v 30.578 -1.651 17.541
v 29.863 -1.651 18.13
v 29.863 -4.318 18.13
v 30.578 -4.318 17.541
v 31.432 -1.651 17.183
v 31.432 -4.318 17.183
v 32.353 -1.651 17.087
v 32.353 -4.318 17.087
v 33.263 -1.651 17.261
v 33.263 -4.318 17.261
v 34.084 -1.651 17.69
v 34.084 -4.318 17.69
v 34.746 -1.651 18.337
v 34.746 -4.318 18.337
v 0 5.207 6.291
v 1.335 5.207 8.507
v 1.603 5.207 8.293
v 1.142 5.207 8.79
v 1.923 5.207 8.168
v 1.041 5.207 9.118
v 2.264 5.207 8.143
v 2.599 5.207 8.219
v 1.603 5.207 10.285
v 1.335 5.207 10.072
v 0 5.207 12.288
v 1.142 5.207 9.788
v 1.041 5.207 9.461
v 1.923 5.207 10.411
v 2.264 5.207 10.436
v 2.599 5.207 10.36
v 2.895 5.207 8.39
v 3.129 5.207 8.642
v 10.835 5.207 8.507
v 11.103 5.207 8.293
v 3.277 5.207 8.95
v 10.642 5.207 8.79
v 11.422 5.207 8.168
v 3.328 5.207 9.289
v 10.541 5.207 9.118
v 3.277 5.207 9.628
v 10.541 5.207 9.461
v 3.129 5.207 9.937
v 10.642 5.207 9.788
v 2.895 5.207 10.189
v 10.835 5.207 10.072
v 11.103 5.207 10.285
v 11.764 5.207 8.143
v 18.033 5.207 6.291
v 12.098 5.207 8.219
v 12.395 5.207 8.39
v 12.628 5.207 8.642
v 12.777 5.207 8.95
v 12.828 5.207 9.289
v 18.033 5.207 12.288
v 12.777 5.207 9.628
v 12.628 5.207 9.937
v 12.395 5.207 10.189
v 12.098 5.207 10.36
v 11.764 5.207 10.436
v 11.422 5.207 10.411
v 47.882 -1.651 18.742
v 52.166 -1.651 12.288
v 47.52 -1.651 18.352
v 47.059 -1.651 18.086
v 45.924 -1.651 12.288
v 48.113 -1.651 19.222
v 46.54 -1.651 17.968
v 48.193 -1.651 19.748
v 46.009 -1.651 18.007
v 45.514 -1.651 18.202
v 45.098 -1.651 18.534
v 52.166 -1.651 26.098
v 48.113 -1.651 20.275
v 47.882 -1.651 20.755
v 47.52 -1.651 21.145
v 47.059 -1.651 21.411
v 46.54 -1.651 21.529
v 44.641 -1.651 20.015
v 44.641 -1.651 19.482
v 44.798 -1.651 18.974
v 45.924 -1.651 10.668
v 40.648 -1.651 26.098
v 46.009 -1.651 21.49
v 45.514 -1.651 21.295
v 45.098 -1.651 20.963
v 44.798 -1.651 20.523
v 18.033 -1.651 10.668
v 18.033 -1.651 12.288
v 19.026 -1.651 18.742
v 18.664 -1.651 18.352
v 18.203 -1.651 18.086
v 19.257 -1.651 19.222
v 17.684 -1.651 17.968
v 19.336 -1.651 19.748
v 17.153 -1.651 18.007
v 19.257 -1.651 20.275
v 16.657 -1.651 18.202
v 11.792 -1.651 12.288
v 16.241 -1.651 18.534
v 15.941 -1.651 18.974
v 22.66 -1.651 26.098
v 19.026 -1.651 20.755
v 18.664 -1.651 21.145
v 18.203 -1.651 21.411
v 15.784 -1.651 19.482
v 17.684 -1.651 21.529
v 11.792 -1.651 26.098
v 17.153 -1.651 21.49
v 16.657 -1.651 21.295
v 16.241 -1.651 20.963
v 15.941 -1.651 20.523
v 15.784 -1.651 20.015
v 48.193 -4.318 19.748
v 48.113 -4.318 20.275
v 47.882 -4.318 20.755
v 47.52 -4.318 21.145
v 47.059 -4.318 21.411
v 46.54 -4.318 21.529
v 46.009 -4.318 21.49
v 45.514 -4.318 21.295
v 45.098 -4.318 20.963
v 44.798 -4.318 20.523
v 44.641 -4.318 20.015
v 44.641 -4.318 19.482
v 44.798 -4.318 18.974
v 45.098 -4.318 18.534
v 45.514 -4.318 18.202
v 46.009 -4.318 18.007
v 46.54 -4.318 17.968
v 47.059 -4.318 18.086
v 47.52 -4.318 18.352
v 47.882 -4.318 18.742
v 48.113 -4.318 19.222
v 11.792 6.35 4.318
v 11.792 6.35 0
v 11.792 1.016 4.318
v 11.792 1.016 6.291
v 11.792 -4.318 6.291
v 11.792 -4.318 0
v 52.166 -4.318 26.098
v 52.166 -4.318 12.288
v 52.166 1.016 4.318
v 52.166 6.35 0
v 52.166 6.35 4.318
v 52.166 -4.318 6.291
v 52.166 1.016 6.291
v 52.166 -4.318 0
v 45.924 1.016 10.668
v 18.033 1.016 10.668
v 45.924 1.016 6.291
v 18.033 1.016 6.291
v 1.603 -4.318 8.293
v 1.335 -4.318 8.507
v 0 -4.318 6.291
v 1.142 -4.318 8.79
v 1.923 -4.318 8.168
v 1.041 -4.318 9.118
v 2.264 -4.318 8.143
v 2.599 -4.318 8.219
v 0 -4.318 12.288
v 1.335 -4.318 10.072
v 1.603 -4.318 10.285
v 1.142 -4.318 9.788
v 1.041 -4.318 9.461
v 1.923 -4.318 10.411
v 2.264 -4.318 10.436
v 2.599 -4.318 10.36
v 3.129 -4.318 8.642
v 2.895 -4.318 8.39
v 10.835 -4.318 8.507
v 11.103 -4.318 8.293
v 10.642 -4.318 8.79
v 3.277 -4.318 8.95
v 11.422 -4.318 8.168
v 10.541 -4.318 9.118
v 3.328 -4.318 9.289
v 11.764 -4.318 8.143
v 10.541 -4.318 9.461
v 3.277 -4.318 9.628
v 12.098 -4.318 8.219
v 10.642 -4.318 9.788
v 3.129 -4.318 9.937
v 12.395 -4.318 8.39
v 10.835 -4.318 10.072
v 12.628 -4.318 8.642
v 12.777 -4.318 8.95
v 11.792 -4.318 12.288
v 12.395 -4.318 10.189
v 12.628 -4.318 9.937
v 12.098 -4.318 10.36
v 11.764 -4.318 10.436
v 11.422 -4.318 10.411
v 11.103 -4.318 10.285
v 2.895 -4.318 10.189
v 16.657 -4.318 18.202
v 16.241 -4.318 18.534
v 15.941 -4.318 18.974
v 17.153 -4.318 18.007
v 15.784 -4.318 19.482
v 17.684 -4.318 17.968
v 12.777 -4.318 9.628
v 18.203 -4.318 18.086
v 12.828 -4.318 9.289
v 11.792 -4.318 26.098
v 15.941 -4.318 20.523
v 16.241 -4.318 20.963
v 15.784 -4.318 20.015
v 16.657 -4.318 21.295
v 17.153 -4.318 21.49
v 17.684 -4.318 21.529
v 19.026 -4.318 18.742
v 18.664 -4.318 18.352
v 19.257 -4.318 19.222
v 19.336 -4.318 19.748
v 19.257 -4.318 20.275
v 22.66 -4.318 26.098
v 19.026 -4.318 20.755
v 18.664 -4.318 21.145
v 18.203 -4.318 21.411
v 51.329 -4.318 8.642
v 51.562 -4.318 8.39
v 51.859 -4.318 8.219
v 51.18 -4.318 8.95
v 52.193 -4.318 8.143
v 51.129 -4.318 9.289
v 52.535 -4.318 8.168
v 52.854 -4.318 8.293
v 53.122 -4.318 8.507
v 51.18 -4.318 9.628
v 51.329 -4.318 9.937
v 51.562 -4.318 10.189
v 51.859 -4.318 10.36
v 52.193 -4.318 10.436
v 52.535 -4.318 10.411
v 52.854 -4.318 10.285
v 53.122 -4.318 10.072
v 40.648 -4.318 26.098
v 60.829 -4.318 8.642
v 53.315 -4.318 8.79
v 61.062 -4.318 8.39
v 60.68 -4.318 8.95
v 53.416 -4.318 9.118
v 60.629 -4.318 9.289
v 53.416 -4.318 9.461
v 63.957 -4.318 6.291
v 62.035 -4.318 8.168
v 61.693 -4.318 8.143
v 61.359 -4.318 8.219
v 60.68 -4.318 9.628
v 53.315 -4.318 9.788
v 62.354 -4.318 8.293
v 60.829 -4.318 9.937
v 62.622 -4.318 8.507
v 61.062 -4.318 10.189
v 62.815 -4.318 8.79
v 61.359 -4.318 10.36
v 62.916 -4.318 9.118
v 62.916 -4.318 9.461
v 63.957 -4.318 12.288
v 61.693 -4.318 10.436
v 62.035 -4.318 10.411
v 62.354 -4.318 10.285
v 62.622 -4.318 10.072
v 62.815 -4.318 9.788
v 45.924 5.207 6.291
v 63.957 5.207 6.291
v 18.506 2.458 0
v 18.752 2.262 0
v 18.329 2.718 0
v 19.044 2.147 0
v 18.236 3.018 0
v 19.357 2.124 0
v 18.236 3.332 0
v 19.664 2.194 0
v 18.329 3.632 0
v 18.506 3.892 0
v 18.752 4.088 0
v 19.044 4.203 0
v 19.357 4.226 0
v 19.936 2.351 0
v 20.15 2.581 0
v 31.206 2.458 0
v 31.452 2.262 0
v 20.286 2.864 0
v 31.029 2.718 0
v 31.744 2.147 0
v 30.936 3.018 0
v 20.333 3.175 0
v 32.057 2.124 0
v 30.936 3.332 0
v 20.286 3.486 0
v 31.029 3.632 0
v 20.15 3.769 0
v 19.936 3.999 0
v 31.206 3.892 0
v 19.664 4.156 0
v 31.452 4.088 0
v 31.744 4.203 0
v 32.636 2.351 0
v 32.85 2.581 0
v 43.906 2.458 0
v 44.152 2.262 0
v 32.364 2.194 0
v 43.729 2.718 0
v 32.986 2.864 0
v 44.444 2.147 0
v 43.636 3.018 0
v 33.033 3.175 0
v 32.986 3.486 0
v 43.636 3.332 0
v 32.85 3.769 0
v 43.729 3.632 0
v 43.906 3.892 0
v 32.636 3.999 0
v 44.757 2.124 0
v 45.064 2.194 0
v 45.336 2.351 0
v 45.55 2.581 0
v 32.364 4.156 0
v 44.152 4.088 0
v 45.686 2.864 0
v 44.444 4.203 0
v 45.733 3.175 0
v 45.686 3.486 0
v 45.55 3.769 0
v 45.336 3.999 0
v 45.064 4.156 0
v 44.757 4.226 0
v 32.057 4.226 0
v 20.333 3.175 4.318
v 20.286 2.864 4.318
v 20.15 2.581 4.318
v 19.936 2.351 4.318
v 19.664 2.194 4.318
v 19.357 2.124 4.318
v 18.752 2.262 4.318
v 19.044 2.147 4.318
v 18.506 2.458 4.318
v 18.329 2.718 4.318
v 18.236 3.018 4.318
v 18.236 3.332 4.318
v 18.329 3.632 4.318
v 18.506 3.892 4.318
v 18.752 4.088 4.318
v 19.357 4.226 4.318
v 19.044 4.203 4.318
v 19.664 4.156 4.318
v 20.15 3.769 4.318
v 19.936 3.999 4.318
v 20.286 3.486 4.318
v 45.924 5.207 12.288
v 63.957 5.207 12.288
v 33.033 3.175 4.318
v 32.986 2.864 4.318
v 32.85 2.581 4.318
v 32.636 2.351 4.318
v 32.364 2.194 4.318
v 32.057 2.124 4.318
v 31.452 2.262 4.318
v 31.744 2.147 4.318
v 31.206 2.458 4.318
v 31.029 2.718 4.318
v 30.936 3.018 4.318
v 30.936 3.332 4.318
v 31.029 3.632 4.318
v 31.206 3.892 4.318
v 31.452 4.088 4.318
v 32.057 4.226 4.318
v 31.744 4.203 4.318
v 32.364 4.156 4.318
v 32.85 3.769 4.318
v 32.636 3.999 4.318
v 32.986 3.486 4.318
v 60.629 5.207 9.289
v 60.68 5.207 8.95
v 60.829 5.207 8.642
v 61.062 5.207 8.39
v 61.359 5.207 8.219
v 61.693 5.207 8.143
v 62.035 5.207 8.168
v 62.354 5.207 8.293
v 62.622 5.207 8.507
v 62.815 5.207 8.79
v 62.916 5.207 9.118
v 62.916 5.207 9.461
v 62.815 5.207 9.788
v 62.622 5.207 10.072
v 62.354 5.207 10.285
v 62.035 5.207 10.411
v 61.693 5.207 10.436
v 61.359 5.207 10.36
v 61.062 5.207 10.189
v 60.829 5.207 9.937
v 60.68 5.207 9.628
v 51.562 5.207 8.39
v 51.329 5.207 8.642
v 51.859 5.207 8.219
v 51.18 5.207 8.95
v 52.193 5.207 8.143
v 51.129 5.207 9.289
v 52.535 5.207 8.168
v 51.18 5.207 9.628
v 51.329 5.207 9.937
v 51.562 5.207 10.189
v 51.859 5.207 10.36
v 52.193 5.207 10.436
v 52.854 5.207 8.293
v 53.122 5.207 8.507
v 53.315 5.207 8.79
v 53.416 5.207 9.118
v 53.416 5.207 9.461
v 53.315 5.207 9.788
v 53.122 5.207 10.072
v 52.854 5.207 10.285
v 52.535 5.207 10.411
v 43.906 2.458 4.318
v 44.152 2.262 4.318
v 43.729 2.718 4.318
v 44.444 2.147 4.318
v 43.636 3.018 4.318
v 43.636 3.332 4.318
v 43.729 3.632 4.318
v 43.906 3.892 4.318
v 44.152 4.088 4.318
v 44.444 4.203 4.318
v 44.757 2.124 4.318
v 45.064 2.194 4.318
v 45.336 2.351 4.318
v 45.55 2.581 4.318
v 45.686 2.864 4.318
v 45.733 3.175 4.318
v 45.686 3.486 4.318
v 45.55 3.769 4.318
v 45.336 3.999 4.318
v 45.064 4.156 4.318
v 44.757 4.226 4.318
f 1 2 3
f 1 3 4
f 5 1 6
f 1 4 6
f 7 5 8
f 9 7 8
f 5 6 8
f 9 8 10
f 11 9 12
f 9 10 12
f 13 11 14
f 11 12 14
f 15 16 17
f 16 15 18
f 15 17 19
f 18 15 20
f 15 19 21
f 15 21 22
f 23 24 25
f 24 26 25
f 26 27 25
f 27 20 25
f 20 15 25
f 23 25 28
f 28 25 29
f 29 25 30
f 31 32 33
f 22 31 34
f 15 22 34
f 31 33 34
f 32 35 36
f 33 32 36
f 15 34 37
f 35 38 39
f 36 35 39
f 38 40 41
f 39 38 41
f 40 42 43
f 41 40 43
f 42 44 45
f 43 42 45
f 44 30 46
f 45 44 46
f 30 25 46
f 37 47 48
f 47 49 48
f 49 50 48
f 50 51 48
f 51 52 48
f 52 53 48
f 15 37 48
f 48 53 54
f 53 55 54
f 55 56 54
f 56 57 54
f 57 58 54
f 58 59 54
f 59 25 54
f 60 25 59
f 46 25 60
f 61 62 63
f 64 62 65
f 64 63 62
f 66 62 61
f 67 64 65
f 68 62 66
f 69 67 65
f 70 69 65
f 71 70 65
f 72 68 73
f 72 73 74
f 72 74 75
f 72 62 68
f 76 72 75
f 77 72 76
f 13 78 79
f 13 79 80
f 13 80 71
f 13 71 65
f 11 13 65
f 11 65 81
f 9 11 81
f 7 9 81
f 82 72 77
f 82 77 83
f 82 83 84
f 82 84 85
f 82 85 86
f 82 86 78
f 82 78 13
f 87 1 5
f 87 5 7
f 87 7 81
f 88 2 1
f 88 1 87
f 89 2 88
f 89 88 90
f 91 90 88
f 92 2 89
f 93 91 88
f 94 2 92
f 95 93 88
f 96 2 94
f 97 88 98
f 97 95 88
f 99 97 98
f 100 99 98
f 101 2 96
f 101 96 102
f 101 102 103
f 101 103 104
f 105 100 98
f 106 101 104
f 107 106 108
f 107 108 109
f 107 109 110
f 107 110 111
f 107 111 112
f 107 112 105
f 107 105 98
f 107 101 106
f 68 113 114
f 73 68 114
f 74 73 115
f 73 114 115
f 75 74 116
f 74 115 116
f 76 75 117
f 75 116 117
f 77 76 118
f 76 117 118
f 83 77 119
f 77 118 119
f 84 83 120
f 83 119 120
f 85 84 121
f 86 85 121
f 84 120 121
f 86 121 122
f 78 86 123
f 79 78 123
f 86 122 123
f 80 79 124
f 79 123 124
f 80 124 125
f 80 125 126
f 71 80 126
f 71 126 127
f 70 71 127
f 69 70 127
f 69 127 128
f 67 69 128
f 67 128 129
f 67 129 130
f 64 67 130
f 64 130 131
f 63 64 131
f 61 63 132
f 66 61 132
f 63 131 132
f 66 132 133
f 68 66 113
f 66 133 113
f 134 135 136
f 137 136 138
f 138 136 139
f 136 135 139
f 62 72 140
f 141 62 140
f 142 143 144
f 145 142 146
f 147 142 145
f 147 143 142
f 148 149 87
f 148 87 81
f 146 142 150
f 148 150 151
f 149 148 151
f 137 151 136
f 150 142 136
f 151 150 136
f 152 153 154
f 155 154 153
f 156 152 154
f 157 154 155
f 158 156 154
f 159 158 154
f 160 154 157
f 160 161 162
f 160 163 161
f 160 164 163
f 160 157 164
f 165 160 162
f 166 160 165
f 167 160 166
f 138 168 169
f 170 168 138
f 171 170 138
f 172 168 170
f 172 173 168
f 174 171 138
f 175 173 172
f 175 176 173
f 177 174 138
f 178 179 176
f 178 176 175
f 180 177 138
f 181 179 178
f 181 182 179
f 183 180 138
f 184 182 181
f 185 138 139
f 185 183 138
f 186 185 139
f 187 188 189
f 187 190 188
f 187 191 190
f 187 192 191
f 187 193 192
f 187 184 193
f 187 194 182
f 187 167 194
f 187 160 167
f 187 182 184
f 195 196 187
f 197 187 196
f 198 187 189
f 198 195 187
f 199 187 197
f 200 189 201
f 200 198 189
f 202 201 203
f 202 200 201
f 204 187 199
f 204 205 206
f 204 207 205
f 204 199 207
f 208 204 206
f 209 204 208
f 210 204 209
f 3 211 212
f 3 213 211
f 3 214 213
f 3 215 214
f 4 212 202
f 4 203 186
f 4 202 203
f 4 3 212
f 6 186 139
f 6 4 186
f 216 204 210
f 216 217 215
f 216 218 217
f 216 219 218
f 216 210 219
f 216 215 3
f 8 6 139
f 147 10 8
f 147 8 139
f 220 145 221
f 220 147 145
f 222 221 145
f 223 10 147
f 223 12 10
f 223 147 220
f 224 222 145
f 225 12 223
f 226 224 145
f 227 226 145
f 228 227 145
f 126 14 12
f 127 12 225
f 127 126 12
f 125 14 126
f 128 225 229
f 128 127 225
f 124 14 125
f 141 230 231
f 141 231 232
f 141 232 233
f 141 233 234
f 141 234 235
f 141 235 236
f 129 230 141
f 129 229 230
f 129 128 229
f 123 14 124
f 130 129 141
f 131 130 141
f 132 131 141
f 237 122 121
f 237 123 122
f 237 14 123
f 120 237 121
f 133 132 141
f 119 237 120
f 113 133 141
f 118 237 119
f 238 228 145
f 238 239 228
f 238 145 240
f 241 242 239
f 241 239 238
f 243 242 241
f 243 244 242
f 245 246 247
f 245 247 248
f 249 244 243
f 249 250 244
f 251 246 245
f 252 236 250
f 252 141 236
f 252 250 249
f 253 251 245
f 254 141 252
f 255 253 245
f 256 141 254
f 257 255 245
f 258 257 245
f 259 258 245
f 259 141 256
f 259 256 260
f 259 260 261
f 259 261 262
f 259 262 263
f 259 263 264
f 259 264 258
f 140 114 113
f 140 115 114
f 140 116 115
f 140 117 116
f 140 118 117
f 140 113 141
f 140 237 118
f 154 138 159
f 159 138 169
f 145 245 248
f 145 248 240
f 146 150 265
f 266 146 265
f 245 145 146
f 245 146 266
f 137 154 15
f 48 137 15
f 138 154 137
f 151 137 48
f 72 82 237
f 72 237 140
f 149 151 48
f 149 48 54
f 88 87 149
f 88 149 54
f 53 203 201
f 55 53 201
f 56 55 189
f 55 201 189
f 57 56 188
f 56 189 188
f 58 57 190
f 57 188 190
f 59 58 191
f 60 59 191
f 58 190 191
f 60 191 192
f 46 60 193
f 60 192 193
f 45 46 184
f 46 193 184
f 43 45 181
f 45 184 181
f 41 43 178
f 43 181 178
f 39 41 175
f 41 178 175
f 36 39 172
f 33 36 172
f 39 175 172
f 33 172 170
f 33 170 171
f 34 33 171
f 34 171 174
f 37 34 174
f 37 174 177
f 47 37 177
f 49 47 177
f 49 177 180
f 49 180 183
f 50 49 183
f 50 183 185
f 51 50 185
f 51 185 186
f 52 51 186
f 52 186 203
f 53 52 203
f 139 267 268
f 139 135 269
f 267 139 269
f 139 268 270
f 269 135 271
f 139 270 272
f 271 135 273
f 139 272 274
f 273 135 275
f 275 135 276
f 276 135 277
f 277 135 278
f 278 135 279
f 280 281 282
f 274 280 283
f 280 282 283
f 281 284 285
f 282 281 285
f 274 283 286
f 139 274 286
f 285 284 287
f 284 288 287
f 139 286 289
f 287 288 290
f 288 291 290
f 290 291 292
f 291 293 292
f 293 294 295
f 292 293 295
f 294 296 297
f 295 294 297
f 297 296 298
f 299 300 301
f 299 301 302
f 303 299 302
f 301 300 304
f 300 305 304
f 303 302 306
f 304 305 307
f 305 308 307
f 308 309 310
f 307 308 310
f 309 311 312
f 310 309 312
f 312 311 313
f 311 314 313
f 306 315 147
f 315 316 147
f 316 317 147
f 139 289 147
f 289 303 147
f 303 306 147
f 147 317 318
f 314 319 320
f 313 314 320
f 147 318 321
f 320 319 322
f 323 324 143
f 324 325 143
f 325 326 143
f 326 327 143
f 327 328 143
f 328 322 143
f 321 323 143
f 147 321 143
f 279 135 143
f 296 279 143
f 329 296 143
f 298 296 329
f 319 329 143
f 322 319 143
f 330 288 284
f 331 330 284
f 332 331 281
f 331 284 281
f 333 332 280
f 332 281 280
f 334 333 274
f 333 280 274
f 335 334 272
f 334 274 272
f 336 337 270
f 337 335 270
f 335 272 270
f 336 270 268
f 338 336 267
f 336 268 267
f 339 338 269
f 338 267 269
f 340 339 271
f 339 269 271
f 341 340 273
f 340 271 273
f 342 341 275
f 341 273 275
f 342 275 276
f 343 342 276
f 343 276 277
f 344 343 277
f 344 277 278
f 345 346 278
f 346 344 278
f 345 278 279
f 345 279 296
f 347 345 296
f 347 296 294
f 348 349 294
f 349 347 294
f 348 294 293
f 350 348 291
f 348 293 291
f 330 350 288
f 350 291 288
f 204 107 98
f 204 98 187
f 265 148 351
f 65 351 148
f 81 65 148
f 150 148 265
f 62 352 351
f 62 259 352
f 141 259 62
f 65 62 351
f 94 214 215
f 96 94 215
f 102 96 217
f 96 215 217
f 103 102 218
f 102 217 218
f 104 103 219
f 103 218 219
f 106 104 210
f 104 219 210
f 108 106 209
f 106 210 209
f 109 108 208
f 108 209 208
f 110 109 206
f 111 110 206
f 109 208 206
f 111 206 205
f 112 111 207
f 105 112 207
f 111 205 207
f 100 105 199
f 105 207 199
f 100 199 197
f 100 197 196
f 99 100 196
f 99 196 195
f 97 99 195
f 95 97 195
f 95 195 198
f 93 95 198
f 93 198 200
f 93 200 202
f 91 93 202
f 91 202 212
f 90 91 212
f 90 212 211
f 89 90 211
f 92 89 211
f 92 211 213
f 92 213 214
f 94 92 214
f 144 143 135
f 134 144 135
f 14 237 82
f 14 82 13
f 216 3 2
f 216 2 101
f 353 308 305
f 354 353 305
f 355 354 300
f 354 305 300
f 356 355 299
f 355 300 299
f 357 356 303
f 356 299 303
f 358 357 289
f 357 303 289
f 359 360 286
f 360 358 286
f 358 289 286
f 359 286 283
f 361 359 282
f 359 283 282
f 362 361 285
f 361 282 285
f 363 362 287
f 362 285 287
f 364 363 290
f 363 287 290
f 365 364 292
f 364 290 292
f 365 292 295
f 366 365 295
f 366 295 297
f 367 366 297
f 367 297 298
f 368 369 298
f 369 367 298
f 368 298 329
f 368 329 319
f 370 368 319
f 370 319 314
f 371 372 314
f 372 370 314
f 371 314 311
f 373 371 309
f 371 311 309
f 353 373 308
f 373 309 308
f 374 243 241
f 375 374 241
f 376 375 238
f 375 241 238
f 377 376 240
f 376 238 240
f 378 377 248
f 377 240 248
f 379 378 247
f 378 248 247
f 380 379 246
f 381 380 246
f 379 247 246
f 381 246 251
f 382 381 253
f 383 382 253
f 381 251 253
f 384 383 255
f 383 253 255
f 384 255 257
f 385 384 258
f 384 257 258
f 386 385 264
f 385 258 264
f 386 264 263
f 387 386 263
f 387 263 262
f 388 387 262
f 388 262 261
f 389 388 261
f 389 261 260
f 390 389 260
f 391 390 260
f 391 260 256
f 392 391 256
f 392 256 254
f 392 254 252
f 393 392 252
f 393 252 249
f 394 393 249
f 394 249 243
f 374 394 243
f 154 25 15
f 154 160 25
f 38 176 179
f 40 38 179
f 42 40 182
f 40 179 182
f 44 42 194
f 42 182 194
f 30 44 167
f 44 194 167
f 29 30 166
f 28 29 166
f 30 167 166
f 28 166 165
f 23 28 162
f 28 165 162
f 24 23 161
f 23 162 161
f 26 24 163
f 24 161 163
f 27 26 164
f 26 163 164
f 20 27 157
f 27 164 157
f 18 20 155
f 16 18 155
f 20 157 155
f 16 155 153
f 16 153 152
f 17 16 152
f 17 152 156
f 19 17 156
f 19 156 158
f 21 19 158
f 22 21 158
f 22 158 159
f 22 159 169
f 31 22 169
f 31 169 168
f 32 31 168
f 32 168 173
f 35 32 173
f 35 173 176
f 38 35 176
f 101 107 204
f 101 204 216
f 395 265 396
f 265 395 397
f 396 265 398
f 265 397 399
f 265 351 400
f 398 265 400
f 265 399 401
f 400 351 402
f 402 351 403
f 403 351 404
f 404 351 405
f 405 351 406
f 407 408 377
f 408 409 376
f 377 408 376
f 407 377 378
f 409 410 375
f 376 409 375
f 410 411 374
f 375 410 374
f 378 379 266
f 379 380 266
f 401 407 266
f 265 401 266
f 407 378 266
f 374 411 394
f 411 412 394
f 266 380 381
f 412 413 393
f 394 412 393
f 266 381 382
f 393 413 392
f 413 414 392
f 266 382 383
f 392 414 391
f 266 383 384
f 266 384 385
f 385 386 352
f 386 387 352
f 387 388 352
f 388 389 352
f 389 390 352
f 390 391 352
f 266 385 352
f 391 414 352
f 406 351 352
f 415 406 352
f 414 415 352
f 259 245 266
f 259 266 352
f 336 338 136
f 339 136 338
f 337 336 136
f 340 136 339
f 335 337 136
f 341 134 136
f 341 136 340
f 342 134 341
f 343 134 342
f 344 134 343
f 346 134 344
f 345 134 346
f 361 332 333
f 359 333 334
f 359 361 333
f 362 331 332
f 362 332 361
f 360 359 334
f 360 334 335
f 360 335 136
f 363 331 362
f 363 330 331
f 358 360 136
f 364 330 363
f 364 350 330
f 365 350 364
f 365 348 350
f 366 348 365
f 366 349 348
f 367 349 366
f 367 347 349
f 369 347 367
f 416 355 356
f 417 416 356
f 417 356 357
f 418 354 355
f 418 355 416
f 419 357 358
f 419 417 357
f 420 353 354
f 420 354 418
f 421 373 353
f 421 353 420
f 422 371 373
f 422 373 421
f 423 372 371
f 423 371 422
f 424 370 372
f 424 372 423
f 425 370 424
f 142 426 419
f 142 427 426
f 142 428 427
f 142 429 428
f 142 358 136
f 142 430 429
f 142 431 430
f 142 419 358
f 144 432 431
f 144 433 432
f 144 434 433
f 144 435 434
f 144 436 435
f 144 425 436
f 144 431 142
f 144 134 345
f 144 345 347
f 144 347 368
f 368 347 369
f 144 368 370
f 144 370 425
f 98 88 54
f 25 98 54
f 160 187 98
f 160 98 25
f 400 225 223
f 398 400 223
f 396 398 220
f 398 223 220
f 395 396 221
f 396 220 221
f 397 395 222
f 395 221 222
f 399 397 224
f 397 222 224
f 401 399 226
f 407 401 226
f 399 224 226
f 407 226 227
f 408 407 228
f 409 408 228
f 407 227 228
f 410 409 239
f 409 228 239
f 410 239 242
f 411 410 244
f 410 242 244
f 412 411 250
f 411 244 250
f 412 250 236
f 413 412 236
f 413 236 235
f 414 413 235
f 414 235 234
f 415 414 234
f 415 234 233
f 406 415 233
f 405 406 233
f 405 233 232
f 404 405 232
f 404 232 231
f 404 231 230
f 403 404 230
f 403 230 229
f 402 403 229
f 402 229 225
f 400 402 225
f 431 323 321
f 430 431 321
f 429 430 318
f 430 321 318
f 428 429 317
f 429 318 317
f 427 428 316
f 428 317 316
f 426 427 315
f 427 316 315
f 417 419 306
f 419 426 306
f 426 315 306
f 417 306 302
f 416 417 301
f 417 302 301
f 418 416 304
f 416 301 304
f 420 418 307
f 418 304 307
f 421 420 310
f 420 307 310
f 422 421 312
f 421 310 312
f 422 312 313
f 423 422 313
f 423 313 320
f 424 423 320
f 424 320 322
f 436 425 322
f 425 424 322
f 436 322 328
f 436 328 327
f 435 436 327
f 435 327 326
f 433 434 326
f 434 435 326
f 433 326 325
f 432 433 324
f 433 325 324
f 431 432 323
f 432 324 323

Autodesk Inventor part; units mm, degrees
ref_plane "YZ Plane" through (0, 0, 0) normal (1, 0, 0) x (0, 1, 0)
ref_plane "XZ Plane" through (0, 0, 0) normal (0, 1, 0) x (-1, 0, 0)
ref_plane "XY Plane" through (0, 0, 0) normal (0, 0, 1) x (1, 0, 0)
ref_plane "Work Plane1" through (-0.2015, 0, 0) normal (0, 0, 1) x (1, 0, 0)
sketch "Sketch1" plane through (-0.2015, 0, 0) normal (0, 0, 1) x (1, 0, 0)
  circle A0 centre (19.4801, 3.175) radius 1.0541 projected
  circle A1 centre (44.8801, 3.175) radius 1.0541 projected
  circle A2 centre (57.5801, 3.175) radius 1.0541 construction
  circle A3 centre (6.7801, 3.175) radius 1.0541 construction
  circle A4 centre (32.1801, 3.175) radius 1.0541 projected
  line L0 (0.2015, 0) -> (64.1587, 0) construction
  line L1 (64.1587, 0) -> (64.1587, 6.35) construction
  line L2 (0.2015, 6.35) -> (64.1587, 6.35) construction
  line L3 (0.2015, 0) -> (0.2015, 6.35) construction
  line L4 (52.3672, 6.35) -> (11.9931, 6.35)
  line L5 (11.9931, 6.35) -> (11.9931, 0)
  line L6 (11.9931, 0) -> (52.3672, 0)
  line L7 (52.3672, 0) -> (52.3672, 6.35)
  line L8 (44.8801, 3.175) -> (52.3672, 3.175) construction
  line L9 (19.4801, 3.175) -> (11.9931, 3.175) construction
extrude "Extrusion1" add sketch "Sketch1" along normal blind 4.318
sketch "Sketch2" plane through (11.7916, 0, 0) normal (0, -1, 0) x (1, 0, 0)
  line L0 (0, 0) -> (40.3741, 0) projected
  line L1 (40.3741, 0) -> (40.3741, 4.318) projected
  line L2 (0, 4.318) -> (40.3741, 4.318) projected
  line L3 (0, 0) -> (0, 4.318) projected
  point P0 (-11.7916, 0)
extrude "Extrusion2" add sketch "Sketch2" along normal blind 4.318
sketch "Sketch3" plane through (-0.2015, 0, 4.318) normal (0, 0, 1) x (1, 0, 0)
  line L0 (52.3672, 6.35) -> (52.3672, -4.318) projected
  line L1 (52.3672, 1.016) -> (11.9931, 1.016)
  line L2 (11.9931, 6.35) -> (11.9931, -4.318) projected
  line L3 (52.3672, -4.318) -> (11.9931, -4.318) projected
  line L4 (52.3672, 1.016) -> (11.9931, 1.016)
  line L5 (11.9931, 1.016) -> (11.9931, -4.318)
  line L6 (11.9931, -4.318) -> (52.3672, -4.318)
  line L7 (52.3672, -4.318) -> (52.3672, 1.016)
  point P0 (0.2015, 0)
extrude "Extrusion3" add sketch "Sketch3" along normal blind 21.7805
sketch "Sketch4" plane through (11.7916, -4.318, 0) normal (0, -1, 0) x (1, 0, 0)
  line L0 (0, 0) -> (40.3741, 0) construction
  line L1 (40.3741, 0) -> (40.3741, 26.0985) construction
  line L2 (0, 26.0985) -> (40.3741, 26.0985) construction
  line L3 (0, 0) -> (0, 26.0985) construction
  line L4 (0, 26.0985) -> (40.3741, 26.0985) construction
  line L5 (28.8565, 26.0985) -> (22.9541, 18.3371)
  line L6 (18.0716, 18.1299) -> (10.868, 26.0985)
  line L7 (25.9053, 22.2178) -> (20.1871, 22.2178) construction
  line L8 (20.1871, 22.2178) -> (20.1871, 26.0985) construction
  line L9 (20.1871, 22.2178) -> (14.4698, 22.1142) construction
  line L10 (10.868, 26.0985) -> (28.8565, 26.0985)
  arc A0 (18.0716, 18.1299) -> (22.9541, 18.3371) centre (20.4268, 20.259) ccw
  point P0 (-11.7916, 0)
  point P1 (20.6377, 15.2912)
  dimension "d8" = 3.175
extrude "Extrusion4" cut sketch "Sketch4" against normal through all
sketch "Sketch5" plane through (11.7916, -4.318, 0) normal (0, -1, 0) x (1, 0, 0)
  line L0 (28.8565, 26.0985) -> (22.9541, 18.3371) projected
  arc A0 (18.0716, 18.1299) -> (22.9541, 18.3371) centre (20.4268, 20.259) ccw projected
  line L1 (18.0716, 18.1299) -> (10.868, 26.0985) projected
  line L2 (0, 26.0985) -> (10.868, 26.0985) projected
  line L3 (0, 0) -> (0, 26.0985) projected
  line L4 (0, 0) -> (40.3741, 0) projected
  line L5 (40.3741, 0) -> (40.3741, 26.0985) projected
  line L6 (28.8565, 26.0985) -> (40.3741, 26.0985) projected
  line L7 (40.3741, 0) -> (40.3741, 26.0985) construction
  line L8 (0, 4.318) -> (0, 26.0985) construction
  line L9 (40.3741, 19.7485) -> (0, 19.7485) construction
  line L10 (5.7588, 24.0238) -> (5.7588, 16.2202) construction
  line L11 (28.8565, 26.0985) -> (40.3741, 26.0985) construction
  line L12 (34.6153, 26.0985) -> (34.6153, 15.2083) construction
  line L13 (34.6153, 22.1235) -> (40.3741, 22.1235) construction
  line L14 (40.3741, 4.318) -> (40.3741, 26.0985) construction
  line L15 (5.7588, 22.1235) -> (0, 22.1235) construction
  line L16 (0, 0) -> (0, 26.0985) construction
  circle A1 centre (34.6153, 19.7485) radius 1.7859
  circle A2 centre (5.7588, 19.7485) radius 1.7859
  point P0 (-11.7916, 0)
  dimension "d10" = 6.35
  dimension "d16" = 3.5719
extrude "Extrusion5" cut sketch "Sketch5" against normal through all contours A1 | A2
sketch "Sketch6" plane through (-0.2015, 0, 26.0985) normal (0, 0, 1) x (1, 0, 0)
  line L0 (11.9931, 1.016) -> (11.9931, -4.318) construction
  line L1 (52.3672, -4.318) -> (52.3672, 1.016) construction
  circle A0 centre (32.1801, 3.175) radius 1.0541 construction
  circle A1 centre (44.8801, 3.175) radius 1.0541 construction
  circle A2 centre (19.4801, 3.175) radius 1.0541 construction
  line L2 (52.3672, 6.35) -> (11.9931, 6.35) construction
  line L3 (52.3672, 6.35) -> (52.3672, -4.318) construction
  line L4 (11.9931, -4.318) -> (52.3672, -4.318) construction
  line L5 (11.9931, 6.35) -> (11.9931, -4.318) construction
  line L6 (52.3672, -1.651) -> (11.9931, -1.651)
  line L7 (52.3672, -1.651) -> (11.9931, -1.651)
  line L8 (11.9931, -1.651) -> (11.9931, 6.35)
  line L9 (11.9931, 6.35) -> (52.3672, 6.35)
  line L10 (52.3672, 6.35) -> (52.3672, -1.651)
  point P0 (0.2015, 0)
extrude "Extrusion6" cut sketch "Sketch6" against normal blind 15.4305
sketch "Sketch7" plane through (11.7916, -4.318, 0) normal (0, -1, 0) x (1, 0, 0)
  line L0 (-11.7916, 6.2906) -> (6.2413, 6.2906)
  line L1 (6.2413, 6.2906) -> (6.2413, 12.2882)
  line L2 (6.2413, 12.2882) -> (-11.7916, 12.2882)
  line L3 (-11.7916, 12.2882) -> (-11.7916, 6.2906)
  point P0 (-11.7916, 0)
extrude "Extrusion7" add sketch "Sketch7" against normal blind 9.525
ref_plane "Work Plane2" through (31.9786, 3.175, 4.318) normal (1, 0, 0) x (0, 0, -1)
sketch "Sketch12" plane through (11.7916, -4.318, 0) normal (0, -1, 0) x (1, 0, 0)
  point P0 (-11.7916, 0)
mirror "Mirror2" about plane through (31.9786, 3.175, 4.318) normal (1, 0, 0) of "Extrusion7"
sketch "Sketch13" plane through (11.7916, -4.318, 0) normal (0, -1, 0) x (1, 0, 0)
  line L0 (40.3741, 12.2882) -> (40.3741, 26.0985) construction
  line L1 (28.8565, 26.0985) -> (40.3741, 26.0985) construction
  line L2 (28.8565, 26.0985) -> (22.9541, 18.3371) construction
  arc A0 (18.0716, 18.1299) -> (22.9541, 18.3371) centre (20.4268, 20.259) ccw construction
  line L3 (18.0716, 18.1299) -> (10.868, 26.0985) construction
  line L4 (0, 26.0985) -> (10.868, 26.0985) construction
  line L5 (0, 12.2882) -> (0, 26.0985) construction
  line L6 (0, 12.2882) -> (-11.7916, 12.2882) construction
  line L7 (-11.7916, 12.2882) -> (-11.7916, 6.2906) construction
  line L8 (-11.7916, 6.2906) -> (0, 6.2906) construction
  line L9 (0, 0) -> (0, 6.2906) construction
  line L10 (0, 0) -> (40.3741, 0) construction
  line L11 (40.3741, 0) -> (40.3741, 6.2906) construction
  line L12 (52.1657, 6.2906) -> (40.3741, 6.2906) construction
  line L13 (52.1657, 12.2882) -> (52.1657, 6.2906) construction
  line L14 (40.3741, 12.2882) -> (52.1657, 12.2882) construction
  circle A1 centre (5.7588, 19.7485) radius 1.7859 construction
  circle A2 centre (34.6153, 19.7485) radius 1.7859 construction
  line L15 (-11.7916, 9.2894) -> (52.1657, 9.2894) construction
  circle A3 centre (-9.6132, 9.2894) radius 1.15
  circle A4 centre (-0.1136, 9.2894) radius 1.15
  line L16 (-9.6132, 9.2894) -> (-9.6132, 7.1957) construction
  line L17 (-0.1136, 9.2894) -> (-0.1136, 7.1957) construction
  point P0 (-11.7916, 0)
  dimension "d22" = 9.4996
  dimension "d23" = 2.3
extrude "Extrusion9" cut sketch "Sketch13" against normal through all
mirror "Mirror3" about plane through (31.9786, 3.175, 4.318) normal (1, 0, 0) of "Extrusion9"
properties part number "bumper lever support"
